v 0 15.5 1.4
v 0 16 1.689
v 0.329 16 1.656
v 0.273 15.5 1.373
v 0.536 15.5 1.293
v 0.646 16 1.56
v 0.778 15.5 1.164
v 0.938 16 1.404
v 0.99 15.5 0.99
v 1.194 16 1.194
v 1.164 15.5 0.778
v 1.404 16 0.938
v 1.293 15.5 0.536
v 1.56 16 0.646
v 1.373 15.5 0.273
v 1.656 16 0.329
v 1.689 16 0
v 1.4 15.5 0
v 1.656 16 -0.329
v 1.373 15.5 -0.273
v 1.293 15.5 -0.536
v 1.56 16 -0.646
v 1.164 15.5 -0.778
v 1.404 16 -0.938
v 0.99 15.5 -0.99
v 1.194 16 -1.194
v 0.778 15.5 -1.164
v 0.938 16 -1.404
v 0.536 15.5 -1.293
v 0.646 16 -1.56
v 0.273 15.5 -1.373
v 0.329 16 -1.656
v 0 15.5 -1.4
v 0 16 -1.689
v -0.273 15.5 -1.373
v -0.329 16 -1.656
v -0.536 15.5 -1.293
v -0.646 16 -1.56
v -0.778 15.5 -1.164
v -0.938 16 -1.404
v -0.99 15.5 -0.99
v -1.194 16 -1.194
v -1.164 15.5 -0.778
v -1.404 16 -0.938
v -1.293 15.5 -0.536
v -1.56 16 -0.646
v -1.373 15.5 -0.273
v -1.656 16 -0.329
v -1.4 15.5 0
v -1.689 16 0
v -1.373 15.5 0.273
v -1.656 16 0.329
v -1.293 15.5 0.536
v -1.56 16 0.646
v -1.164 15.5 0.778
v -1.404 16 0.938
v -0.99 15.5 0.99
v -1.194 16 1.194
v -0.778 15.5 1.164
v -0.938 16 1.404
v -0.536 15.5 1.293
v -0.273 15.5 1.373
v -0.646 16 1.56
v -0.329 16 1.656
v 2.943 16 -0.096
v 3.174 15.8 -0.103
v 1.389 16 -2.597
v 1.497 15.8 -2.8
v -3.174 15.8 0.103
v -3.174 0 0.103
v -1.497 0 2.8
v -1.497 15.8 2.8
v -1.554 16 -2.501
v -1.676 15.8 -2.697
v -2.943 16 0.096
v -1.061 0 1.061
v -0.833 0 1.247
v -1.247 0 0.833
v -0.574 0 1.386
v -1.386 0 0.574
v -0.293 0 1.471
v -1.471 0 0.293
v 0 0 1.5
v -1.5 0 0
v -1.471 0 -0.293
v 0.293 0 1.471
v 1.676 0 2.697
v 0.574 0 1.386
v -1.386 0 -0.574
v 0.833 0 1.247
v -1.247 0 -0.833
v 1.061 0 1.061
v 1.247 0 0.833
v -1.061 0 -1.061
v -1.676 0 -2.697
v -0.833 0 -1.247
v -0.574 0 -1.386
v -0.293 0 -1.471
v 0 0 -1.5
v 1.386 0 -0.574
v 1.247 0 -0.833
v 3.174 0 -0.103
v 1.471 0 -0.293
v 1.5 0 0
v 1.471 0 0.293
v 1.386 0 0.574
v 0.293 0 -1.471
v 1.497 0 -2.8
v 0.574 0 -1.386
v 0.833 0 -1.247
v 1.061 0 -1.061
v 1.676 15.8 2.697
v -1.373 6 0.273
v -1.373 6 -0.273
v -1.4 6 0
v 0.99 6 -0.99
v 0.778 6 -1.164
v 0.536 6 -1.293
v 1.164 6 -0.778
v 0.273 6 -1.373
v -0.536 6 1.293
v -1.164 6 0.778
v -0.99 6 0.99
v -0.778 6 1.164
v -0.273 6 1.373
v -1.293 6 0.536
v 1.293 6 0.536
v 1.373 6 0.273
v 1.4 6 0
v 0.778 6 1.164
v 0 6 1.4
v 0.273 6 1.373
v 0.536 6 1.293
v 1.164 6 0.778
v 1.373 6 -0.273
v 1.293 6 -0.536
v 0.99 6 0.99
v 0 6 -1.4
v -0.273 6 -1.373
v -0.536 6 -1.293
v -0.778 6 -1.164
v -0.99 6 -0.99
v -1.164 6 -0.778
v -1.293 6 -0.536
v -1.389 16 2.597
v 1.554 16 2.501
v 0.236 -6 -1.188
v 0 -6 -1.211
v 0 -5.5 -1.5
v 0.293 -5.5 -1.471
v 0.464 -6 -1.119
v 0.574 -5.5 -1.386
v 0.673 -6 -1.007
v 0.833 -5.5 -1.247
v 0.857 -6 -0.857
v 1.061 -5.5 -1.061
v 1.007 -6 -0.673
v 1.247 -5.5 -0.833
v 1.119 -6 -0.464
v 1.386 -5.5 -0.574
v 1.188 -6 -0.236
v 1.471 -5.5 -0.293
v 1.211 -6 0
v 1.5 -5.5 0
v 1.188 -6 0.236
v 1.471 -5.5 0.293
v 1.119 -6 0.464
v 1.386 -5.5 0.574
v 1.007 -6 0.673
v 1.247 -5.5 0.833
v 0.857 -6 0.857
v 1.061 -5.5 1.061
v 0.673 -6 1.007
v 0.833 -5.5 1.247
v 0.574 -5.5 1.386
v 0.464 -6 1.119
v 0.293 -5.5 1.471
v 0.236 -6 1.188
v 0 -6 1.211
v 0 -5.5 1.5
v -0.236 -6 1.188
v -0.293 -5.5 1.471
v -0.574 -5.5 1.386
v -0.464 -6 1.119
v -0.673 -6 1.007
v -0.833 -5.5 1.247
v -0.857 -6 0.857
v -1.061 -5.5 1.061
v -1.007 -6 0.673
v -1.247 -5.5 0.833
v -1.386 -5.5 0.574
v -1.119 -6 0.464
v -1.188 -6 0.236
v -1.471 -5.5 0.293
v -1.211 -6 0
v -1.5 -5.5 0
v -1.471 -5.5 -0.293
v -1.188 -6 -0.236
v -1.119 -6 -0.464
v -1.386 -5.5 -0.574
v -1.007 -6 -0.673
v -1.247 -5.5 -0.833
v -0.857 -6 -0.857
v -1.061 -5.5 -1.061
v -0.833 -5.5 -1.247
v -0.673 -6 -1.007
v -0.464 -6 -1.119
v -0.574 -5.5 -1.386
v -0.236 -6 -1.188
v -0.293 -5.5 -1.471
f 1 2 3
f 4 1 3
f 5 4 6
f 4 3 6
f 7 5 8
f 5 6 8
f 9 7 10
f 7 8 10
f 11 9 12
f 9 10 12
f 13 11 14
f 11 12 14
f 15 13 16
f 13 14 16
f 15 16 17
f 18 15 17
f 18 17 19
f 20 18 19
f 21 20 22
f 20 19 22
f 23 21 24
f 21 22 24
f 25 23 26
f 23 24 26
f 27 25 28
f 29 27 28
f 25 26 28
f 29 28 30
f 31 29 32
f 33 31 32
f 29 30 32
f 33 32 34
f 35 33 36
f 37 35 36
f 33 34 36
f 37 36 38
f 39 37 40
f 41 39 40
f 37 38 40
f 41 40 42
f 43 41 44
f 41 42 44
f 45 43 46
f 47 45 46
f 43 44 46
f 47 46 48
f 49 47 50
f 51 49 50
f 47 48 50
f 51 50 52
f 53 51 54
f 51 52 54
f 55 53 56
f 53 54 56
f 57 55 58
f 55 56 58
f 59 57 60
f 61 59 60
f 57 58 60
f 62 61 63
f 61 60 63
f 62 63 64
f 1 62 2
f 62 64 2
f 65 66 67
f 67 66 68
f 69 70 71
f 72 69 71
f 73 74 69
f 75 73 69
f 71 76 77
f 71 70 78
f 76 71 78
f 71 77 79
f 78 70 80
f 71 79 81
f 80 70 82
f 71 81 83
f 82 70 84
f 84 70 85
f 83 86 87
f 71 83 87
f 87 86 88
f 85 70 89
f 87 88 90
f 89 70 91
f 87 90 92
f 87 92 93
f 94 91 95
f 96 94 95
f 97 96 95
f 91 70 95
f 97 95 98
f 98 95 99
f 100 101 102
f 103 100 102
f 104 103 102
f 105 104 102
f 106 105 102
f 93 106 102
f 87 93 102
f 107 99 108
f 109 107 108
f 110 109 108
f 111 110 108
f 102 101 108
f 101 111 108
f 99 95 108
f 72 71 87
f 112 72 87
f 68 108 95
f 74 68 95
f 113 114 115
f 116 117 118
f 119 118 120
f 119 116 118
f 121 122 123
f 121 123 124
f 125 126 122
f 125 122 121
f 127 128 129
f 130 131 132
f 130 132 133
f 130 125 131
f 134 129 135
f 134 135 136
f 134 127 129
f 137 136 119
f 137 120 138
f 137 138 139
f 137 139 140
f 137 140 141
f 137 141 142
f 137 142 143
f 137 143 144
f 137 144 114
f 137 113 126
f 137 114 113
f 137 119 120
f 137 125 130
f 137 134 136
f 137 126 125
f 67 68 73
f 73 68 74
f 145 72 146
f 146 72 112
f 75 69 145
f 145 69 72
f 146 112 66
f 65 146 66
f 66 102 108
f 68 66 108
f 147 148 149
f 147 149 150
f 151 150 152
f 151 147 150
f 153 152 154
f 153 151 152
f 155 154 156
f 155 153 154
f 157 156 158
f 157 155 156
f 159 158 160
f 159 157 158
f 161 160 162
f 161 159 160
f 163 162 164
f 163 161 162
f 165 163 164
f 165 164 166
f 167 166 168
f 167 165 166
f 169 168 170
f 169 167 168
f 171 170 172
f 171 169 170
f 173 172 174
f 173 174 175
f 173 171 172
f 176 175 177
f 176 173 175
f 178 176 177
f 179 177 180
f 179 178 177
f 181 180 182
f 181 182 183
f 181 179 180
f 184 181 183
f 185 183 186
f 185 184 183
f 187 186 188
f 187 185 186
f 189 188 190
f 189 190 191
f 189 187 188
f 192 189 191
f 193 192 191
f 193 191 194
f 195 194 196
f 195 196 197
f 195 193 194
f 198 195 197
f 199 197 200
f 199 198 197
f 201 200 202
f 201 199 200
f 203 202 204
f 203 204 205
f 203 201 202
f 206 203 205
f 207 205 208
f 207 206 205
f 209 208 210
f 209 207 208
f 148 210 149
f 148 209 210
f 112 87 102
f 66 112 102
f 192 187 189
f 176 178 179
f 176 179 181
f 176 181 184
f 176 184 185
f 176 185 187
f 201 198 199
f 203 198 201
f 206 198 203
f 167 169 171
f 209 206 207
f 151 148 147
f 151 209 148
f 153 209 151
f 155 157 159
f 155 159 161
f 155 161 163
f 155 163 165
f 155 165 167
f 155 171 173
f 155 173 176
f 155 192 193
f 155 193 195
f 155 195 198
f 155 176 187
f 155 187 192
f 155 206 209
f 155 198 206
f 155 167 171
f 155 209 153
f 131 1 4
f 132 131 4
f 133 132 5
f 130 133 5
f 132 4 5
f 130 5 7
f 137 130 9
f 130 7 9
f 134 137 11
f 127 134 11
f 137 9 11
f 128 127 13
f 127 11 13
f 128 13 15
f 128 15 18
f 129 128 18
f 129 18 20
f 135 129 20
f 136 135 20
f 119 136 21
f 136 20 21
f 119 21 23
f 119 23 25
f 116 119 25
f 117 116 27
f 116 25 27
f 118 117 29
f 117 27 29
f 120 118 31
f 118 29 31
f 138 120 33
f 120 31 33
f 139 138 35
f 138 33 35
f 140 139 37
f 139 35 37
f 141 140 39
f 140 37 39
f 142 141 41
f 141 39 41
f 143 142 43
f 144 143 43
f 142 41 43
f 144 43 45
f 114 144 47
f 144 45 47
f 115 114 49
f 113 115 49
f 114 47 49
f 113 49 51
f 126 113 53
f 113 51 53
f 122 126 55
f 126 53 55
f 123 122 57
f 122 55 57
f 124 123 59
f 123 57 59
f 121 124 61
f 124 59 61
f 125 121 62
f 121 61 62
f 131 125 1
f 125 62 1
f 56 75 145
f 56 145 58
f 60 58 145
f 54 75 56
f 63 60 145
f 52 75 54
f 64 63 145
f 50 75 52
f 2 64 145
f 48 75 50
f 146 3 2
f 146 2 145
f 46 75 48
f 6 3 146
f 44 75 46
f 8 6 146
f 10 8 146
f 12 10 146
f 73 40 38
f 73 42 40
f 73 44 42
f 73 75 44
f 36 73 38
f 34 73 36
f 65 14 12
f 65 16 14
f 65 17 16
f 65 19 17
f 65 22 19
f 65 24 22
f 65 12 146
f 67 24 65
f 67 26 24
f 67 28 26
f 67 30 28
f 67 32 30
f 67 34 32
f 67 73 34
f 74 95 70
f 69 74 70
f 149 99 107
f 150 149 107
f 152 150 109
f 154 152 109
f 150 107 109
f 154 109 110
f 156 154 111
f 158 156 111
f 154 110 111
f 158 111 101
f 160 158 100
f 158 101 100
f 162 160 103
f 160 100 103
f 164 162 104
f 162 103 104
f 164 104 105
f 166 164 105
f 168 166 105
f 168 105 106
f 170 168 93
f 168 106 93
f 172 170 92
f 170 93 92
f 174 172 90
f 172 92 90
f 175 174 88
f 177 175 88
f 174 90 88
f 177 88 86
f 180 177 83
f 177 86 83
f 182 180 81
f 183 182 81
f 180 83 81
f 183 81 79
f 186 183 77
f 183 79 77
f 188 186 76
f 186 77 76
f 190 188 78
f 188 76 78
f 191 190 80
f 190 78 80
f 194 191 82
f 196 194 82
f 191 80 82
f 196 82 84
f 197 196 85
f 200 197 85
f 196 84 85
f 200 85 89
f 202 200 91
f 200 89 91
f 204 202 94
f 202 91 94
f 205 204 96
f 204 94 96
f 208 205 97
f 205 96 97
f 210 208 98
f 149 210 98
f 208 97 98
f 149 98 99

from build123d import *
from OCP.BRepFilletAPI import BRepFilletAPI_MakeChamfer

# Parameters (mm, degrees)
BOSS_EXTRUDE1_DEPTH = 16
SKETCH2_R           = 1.4
CUT_EXTRUDE1_DEPTH  = 10
SKETCH3_R           = 1.5
BOSS_EXTRUDE2_DEPTH = 6
CHAMFER1_SIZE       = 0.5
CHAMFER1_SIZE2      = 0.288675135
CHAMFER2_SIZE       = 0.2


with BuildPart() as part:
    # Sketch1 → Boss-Extrude1 (new body)
    with BuildSketch(Plane(origin=(0, 0, 0), x_dir=(1, 0, 0), z_dir=(0, 1, 0))):
        Polygon((1.497494138, 2.800150824), (-1.676254679, 2.696943378), (-3.173748817, -0.103207446), (-1.497494138, -2.800150824), (1.676254679, -2.696943378), (3.173748817, 0.103207446), align=None)
    extrude(amount=BOSS_EXTRUDE1_DEPTH)

    # Sketch2 → Cut-Extrude1 (cut)
    with BuildSketch(Plane(origin=(0, 16, 0), x_dir=(1, 0, 0), z_dir=(0, 1, 0))):
        with Locations(Location((0, 0, 0), (0, 0, 270))):
            Circle(SKETCH2_R)
    extrude(amount=-CUT_EXTRUDE1_DEPTH, mode=Mode.SUBTRACT)

    # Sketch3 → Boss-Extrude2 (add)
    with BuildSketch(Plane.XZ):
        with Locations(Location((0, 0, 0), (0, 0, 270))):
            Circle(SKETCH3_R)
    extrude(amount=BOSS_EXTRUDE2_DEPTH)

    # Chamfer1: one chamfer whose edges measure the first distance from different faces: ONE call of the kernel's chamfer builder (chamfer() names one face for all edges)
    chamfer1_edges_1 = [part.edges().sort_by_distance(p)[0] for p in [
        (0, 16, -1.4),
    ]]
    chamfer1_side_1 = [part.faces().sort_by_distance(p)[0] for p in [
        (0, 11, -1.4),
    ]]
    chamfer1_edges_2 = [part.edges().sort_by_distance(p)[0] for p in [
        (0, -6, 1.5),
    ]]
    chamfer1_side_2 = [part.faces().sort_by_distance(p)[0] for p in [
        (0, -3, 1.5),
    ]]
    chamfer1 = BRepFilletAPI_MakeChamfer(part.part.solid().wrapped)
    for e in chamfer1_edges_1:
        chamfer1.Add(CHAMFER1_SIZE, CHAMFER1_SIZE2, e.wrapped, chamfer1_side_1[0].wrapped)  # the first distance lies on this face
    for e in chamfer1_edges_2:
        chamfer1.Add(CHAMFER1_SIZE, CHAMFER1_SIZE2, e.wrapped, chamfer1_side_2[0].wrapped)  # the first distance lies on this face
    add(Compound.cast(chamfer1.Shape()), mode=Mode.REPLACE)

    # Chamfer2
    chamfer2_edges = [part.edges().sort_by_distance(p)[0] for p in [
        (-2.425001748, 16, -1.296867966),
        (-2.335621478, 16, 1.451679135),
        (0.08938027, 16, 2.748547101),
        (2.425001748, 16, 1.296867966),
        (2.335621478, 16, -1.451679135),
        (-0.08938027, 16, -2.748547101),
    ]]
    chamfer(chamfer2_edges, length=CHAMFER2_SIZE)


solid = part.part
